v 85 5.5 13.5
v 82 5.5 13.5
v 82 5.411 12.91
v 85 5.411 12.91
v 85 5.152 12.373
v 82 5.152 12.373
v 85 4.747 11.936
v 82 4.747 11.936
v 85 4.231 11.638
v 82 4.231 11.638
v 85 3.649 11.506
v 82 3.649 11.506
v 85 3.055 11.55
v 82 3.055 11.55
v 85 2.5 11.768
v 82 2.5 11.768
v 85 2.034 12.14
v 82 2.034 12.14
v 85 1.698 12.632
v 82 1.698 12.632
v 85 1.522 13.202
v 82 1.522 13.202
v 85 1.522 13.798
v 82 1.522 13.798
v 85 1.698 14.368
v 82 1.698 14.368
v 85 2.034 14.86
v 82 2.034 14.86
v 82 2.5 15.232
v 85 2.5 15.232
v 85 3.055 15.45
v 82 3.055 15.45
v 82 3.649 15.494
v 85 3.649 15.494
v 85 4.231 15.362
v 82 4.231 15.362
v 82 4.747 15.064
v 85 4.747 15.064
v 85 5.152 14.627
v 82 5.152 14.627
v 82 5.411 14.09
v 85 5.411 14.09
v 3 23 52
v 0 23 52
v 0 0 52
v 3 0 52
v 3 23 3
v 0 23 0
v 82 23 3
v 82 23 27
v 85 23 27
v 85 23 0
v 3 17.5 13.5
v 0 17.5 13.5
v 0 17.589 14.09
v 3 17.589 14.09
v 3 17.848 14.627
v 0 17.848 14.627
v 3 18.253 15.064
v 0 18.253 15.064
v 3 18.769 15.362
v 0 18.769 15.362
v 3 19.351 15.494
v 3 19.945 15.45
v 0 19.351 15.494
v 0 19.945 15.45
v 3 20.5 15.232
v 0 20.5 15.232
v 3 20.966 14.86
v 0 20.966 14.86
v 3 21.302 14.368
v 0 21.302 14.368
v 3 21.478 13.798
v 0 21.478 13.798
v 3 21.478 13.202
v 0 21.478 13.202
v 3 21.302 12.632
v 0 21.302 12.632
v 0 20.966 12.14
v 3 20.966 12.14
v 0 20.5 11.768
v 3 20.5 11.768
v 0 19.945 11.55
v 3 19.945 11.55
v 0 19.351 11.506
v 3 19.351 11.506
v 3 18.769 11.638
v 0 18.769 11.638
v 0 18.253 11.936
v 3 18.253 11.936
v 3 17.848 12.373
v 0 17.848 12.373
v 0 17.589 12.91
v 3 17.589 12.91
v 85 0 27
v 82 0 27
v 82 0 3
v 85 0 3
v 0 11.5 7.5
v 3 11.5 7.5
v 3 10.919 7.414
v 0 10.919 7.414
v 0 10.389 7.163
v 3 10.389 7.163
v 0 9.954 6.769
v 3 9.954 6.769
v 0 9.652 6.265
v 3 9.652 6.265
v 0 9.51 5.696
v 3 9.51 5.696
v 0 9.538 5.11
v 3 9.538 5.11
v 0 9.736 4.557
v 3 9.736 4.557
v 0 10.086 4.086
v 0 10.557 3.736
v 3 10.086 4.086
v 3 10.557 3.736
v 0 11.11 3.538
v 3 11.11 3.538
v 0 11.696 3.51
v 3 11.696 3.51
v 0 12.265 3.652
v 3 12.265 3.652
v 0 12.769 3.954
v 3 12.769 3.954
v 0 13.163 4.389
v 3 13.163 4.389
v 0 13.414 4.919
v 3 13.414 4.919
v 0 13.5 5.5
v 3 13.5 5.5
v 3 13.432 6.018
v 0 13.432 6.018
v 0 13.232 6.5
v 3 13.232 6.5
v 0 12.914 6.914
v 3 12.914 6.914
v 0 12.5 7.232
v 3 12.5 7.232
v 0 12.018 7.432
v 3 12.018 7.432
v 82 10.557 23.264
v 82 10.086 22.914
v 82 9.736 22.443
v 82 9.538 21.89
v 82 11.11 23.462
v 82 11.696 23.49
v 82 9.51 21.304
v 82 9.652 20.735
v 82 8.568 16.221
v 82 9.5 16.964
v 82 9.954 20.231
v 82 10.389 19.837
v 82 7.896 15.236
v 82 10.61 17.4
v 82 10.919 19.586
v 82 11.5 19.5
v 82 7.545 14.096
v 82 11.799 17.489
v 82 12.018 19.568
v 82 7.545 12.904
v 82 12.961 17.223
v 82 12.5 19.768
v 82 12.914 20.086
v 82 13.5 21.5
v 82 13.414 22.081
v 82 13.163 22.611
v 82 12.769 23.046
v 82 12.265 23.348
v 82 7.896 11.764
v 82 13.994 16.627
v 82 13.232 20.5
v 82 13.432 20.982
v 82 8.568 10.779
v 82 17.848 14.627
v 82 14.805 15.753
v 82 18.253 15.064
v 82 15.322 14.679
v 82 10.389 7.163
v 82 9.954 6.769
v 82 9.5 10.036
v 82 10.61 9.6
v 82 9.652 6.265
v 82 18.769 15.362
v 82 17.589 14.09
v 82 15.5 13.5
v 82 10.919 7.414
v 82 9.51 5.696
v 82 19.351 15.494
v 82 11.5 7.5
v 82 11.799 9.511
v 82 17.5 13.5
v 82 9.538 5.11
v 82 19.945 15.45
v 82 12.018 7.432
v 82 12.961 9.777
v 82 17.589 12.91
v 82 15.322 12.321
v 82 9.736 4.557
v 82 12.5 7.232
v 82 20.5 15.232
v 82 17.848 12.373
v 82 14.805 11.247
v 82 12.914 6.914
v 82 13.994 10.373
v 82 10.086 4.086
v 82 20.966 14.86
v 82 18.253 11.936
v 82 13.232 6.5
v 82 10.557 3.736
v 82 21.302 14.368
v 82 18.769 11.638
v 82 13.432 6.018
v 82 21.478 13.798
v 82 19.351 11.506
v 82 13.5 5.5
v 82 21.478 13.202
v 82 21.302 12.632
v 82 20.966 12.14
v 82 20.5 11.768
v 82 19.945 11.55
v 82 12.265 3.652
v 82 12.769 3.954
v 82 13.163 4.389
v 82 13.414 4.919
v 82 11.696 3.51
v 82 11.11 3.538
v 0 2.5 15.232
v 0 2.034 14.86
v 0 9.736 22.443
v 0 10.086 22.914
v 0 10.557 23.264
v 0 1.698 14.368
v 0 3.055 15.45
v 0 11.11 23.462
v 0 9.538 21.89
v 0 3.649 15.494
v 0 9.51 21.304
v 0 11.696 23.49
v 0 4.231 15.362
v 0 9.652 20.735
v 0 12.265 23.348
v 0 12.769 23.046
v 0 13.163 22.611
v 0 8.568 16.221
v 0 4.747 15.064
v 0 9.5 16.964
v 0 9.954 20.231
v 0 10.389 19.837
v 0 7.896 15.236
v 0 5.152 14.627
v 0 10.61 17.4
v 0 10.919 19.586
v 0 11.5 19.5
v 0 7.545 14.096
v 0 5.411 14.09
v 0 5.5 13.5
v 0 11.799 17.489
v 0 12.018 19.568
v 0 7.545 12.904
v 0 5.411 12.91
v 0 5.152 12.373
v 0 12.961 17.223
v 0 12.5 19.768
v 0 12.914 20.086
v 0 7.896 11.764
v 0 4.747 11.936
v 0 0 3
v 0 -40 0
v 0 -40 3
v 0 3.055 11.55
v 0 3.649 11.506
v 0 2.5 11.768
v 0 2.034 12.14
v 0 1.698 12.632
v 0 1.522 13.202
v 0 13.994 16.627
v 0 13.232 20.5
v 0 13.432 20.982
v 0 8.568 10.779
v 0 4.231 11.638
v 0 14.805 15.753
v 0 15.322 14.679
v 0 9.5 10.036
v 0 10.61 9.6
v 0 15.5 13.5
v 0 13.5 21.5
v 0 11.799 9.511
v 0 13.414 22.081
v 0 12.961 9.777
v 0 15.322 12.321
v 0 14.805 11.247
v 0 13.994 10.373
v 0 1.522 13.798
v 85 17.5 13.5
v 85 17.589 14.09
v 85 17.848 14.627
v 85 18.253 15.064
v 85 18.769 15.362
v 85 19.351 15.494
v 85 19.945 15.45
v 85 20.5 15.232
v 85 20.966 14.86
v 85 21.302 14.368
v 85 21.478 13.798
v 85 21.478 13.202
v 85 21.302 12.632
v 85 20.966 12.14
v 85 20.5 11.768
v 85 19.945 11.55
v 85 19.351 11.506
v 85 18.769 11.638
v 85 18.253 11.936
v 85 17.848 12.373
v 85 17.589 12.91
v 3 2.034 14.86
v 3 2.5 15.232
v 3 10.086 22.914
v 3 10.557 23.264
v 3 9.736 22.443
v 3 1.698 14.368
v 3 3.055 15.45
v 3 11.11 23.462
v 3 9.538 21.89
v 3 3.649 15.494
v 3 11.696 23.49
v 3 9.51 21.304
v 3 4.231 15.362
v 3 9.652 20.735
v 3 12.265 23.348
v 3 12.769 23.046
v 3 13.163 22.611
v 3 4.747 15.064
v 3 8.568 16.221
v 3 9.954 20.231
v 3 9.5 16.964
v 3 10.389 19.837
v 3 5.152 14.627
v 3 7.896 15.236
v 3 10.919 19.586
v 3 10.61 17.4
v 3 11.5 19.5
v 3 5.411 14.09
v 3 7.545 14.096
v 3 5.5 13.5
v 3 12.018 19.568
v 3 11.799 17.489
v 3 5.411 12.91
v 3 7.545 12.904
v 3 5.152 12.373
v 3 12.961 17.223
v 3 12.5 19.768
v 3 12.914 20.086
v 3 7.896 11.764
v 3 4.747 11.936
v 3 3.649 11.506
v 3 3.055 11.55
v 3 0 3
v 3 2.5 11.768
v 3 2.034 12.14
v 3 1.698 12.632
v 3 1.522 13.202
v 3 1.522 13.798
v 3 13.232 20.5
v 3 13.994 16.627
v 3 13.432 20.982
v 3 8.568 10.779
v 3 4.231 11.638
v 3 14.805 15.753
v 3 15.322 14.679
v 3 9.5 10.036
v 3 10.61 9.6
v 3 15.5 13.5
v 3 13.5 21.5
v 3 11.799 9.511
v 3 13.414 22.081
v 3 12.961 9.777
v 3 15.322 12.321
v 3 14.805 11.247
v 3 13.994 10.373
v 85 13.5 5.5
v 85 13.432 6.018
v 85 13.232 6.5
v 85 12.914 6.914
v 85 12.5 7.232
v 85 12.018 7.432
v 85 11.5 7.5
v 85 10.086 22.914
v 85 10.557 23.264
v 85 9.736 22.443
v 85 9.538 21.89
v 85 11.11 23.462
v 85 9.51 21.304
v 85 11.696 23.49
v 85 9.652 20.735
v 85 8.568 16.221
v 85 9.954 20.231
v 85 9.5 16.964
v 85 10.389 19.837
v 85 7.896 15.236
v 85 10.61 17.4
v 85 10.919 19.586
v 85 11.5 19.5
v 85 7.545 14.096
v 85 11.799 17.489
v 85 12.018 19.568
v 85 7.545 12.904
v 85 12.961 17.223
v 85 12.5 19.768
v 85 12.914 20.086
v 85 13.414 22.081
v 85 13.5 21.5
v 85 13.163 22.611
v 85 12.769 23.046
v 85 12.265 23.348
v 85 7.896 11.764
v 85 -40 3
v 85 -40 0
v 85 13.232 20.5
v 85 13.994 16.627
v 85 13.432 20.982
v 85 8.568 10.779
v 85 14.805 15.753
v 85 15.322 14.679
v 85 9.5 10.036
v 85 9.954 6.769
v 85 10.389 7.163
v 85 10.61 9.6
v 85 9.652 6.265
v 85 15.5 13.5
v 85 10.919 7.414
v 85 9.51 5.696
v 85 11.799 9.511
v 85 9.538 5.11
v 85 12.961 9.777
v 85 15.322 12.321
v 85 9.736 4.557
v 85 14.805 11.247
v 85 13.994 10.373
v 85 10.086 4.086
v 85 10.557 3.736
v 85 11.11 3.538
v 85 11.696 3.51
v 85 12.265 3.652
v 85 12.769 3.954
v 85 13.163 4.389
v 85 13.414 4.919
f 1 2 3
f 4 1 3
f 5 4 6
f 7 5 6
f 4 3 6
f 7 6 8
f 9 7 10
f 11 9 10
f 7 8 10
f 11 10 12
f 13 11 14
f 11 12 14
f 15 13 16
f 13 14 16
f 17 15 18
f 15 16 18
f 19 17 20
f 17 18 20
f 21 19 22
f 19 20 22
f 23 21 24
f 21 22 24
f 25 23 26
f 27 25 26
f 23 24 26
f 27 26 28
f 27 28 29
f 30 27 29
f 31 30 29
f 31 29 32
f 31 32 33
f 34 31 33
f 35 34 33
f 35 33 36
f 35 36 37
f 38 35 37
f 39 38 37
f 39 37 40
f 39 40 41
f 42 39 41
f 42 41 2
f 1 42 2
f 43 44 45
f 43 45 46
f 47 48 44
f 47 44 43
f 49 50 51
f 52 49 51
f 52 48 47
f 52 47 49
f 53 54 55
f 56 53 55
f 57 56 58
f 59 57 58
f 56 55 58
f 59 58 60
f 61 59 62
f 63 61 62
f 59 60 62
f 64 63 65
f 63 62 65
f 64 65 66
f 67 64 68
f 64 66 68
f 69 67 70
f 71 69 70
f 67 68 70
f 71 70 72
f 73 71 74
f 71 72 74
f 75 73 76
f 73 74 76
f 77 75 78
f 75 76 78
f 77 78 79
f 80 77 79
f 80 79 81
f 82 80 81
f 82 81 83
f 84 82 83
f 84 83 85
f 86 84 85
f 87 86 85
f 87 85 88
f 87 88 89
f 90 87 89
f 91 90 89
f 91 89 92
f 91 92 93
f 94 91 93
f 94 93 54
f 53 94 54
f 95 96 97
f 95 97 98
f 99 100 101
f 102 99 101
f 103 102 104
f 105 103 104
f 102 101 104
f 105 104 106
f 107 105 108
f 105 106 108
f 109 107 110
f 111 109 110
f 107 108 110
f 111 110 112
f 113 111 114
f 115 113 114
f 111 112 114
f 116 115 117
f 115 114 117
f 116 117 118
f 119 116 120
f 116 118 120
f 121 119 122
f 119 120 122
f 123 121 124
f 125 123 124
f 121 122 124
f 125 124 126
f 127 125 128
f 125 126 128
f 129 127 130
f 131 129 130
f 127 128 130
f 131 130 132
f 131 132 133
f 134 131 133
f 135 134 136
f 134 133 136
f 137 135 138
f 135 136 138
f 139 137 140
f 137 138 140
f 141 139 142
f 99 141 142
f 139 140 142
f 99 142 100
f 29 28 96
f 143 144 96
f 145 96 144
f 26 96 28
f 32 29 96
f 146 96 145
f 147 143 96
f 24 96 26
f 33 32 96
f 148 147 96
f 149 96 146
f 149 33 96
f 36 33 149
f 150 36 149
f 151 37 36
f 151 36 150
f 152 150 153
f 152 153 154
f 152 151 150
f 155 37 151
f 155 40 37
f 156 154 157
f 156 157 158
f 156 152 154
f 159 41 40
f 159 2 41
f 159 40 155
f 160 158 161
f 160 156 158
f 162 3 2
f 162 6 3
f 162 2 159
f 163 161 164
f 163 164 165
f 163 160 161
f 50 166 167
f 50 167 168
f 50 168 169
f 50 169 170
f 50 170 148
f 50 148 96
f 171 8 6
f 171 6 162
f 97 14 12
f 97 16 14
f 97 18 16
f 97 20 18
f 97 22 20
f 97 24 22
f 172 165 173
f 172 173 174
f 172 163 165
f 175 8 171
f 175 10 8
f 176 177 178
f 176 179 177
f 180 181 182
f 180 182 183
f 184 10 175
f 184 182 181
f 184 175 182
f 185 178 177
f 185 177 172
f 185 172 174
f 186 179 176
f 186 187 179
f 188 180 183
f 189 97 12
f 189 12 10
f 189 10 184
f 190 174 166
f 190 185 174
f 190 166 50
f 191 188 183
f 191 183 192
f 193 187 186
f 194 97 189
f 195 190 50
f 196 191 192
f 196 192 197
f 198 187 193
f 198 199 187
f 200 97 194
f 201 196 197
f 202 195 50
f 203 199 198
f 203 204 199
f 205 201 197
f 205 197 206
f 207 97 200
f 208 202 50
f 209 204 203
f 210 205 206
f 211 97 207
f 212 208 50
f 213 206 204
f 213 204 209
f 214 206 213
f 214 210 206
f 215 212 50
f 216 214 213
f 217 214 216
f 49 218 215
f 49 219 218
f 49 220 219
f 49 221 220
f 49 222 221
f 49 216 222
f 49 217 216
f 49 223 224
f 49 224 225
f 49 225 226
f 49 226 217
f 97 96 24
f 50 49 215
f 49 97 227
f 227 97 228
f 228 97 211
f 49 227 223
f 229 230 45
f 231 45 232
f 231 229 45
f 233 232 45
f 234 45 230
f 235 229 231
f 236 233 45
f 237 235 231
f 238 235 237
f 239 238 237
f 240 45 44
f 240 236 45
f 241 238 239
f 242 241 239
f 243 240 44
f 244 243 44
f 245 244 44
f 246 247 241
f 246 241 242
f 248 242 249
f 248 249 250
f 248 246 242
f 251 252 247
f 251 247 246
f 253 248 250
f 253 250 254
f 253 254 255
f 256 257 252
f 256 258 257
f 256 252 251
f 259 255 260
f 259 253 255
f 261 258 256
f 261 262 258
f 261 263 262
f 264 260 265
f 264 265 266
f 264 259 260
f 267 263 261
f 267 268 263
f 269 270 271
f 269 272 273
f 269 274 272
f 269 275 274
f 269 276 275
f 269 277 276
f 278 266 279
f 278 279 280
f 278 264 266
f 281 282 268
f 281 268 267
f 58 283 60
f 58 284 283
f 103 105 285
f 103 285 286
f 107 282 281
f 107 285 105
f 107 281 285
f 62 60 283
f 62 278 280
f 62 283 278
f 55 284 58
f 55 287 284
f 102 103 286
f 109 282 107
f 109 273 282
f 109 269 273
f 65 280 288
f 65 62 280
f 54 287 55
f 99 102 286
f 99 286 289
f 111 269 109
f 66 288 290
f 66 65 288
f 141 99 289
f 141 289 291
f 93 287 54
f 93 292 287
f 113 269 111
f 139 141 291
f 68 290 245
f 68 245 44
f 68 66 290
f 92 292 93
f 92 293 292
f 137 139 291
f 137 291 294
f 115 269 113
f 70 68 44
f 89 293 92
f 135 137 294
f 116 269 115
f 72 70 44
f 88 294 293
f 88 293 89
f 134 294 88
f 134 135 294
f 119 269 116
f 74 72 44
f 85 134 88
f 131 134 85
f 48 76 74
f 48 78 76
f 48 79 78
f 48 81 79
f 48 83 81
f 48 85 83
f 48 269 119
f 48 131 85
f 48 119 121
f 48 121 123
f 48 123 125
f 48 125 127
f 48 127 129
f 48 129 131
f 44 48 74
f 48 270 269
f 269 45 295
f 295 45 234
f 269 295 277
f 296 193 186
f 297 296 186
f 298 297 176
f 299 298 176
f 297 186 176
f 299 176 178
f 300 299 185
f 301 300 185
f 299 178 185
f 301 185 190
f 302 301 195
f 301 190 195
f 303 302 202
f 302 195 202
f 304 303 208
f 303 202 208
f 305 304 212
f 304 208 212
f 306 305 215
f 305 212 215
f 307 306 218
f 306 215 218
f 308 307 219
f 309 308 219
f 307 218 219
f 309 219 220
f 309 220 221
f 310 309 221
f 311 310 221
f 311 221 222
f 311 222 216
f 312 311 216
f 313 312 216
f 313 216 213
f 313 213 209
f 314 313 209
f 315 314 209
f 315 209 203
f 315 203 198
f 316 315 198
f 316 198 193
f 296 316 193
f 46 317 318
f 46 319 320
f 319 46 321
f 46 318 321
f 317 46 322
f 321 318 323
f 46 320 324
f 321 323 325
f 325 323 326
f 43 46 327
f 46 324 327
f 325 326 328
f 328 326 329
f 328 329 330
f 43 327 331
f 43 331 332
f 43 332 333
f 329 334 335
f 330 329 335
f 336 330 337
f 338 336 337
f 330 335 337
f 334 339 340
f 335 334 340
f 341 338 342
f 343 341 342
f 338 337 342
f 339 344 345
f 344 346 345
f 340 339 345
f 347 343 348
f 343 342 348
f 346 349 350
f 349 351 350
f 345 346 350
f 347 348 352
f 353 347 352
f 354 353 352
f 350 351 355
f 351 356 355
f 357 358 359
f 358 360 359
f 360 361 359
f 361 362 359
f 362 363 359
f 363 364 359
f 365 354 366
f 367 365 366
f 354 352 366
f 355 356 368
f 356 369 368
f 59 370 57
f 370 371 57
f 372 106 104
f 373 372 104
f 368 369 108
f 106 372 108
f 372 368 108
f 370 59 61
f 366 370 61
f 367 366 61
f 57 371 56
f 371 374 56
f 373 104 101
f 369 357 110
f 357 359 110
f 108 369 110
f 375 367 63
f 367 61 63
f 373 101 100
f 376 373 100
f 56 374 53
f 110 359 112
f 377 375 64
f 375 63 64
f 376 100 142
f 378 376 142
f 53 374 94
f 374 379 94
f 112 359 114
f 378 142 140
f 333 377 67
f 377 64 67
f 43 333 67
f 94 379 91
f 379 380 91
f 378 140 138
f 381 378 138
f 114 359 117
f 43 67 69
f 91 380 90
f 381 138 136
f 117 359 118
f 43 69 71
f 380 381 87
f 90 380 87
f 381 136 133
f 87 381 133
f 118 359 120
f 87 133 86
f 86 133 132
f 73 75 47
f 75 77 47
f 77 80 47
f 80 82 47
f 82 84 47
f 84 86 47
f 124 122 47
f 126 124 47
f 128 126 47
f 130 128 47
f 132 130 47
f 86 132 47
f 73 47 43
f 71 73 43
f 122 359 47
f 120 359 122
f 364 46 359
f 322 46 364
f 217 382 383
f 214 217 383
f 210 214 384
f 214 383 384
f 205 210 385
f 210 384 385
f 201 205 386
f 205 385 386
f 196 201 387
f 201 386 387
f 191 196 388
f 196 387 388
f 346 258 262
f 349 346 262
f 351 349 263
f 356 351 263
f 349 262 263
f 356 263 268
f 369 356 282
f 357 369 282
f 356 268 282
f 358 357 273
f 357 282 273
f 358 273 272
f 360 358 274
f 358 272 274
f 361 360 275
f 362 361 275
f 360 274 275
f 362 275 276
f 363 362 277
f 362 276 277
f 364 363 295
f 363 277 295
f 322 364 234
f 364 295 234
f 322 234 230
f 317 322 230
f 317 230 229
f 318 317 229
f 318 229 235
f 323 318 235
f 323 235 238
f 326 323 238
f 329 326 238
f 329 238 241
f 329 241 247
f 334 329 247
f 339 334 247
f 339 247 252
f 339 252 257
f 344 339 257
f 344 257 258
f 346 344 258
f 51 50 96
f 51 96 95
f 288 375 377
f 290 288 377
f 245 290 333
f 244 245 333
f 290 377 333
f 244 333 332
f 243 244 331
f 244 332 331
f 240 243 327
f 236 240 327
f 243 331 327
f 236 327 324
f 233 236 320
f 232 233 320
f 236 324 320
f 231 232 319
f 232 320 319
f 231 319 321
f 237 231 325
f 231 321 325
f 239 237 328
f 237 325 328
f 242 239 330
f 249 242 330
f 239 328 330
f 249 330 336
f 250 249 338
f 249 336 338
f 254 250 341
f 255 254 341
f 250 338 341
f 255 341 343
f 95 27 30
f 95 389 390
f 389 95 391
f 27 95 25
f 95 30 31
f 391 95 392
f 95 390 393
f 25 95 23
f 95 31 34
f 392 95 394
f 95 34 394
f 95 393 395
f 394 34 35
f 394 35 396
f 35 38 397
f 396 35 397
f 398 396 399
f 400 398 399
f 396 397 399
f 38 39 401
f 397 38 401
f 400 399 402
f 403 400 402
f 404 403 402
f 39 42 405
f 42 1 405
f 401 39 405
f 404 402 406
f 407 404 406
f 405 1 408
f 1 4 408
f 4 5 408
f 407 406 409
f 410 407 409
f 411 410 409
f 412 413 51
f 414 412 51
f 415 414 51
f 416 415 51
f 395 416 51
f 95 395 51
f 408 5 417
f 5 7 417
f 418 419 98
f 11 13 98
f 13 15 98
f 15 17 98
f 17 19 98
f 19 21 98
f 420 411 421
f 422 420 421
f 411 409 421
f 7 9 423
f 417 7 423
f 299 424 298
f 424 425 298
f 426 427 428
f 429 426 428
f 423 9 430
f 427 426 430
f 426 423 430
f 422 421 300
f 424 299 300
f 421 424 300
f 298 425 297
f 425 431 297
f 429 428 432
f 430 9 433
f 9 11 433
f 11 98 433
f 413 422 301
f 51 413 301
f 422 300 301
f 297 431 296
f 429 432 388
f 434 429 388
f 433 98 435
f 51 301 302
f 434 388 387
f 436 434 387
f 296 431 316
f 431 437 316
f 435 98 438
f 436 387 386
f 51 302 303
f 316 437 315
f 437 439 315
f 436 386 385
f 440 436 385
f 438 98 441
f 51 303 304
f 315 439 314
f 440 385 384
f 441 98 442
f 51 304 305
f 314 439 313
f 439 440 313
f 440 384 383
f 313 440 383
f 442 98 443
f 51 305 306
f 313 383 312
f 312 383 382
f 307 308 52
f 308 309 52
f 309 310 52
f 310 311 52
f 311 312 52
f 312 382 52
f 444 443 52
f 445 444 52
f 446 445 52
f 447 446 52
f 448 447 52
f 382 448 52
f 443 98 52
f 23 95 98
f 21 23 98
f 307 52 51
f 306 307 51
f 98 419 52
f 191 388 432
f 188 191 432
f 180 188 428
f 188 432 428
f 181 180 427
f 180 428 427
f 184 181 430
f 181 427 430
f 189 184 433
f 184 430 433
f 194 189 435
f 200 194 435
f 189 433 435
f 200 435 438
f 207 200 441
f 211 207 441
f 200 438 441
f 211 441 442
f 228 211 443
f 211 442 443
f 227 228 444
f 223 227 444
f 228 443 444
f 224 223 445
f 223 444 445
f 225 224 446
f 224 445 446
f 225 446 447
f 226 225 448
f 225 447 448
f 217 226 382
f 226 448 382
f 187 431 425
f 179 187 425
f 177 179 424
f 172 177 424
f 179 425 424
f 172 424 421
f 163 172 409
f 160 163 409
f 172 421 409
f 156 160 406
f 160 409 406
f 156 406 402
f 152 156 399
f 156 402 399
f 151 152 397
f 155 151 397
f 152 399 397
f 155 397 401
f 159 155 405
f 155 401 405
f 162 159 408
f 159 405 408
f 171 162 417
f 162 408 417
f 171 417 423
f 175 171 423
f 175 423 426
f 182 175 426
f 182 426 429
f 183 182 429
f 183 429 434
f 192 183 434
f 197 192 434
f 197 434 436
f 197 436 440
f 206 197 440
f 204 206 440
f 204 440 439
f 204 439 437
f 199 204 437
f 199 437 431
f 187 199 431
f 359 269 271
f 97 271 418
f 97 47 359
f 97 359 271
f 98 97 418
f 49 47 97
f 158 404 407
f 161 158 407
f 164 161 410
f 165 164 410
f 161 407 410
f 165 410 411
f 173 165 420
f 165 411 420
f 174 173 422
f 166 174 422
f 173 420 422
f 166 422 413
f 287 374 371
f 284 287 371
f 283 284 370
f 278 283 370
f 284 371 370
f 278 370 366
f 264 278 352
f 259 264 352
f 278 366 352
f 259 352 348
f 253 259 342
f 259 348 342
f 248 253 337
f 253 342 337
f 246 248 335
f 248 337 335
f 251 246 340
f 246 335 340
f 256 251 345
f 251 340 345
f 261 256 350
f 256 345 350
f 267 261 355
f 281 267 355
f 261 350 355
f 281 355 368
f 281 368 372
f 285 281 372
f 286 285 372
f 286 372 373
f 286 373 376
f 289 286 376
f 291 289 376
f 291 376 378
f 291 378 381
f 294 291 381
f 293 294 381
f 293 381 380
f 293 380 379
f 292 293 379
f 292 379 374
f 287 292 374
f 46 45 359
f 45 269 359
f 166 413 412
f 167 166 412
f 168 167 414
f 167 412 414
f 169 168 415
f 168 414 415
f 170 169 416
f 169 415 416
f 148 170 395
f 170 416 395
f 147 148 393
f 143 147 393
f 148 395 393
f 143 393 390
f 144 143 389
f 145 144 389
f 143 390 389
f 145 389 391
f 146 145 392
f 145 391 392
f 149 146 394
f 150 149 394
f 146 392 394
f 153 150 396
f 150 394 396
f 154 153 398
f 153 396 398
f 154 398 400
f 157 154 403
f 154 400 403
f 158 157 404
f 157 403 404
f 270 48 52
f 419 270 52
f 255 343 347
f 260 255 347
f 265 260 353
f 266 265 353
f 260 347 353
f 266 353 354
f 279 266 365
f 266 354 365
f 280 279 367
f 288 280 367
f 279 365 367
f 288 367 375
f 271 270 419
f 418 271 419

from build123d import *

# Parameters (mm, degrees)
F0_W      = 85
F0_H      = 23
F0_H_2    = 40
F1_DEPTH  = 3
F2_W      = 3
F2_H      = 23
F3_DEPTH  = 24
F4_W      = 3
F4_H      = 23
F5_DEPTH  = 25
F6_R      = 4
F7_DEPTH  = 200
F8_R      = 2
F9_DEPTH  = 250
F11_DEPTH = 250


with BuildPart() as f1:
    # F0 (on Top) → F1 (new body)
    with BuildSketch(Plane.XY):
        with Locations((42.5, 11.5)):
            Rectangle(F0_W, F0_H)
        with Locations((42.5, -20)):
            Rectangle(F0_W, F0_H_2)
    extrude(amount=F1_DEPTH)

    # F2 (on face) → F3 (join)
    with BuildSketch(Plane.XY.offset(3)):
        with Locations((1.5, 11.5)):
            Rectangle(F2_W, F2_H)
        with Locations((83.5, 11.5)):
            Rectangle(F2_W, F2_H)
    extrude(amount=F3_DEPTH)

    # F4 (on face) → F5 (join)
    with BuildSketch(Plane.XY.offset(27)):
        with Locations((1.5, 11.5)):
            Rectangle(F4_W, F4_H)
    extrude(amount=F5_DEPTH)

    # F6 (on face) → F7 (cut)
    with BuildSketch(Plane.YZ.offset(85)):
        with Locations((11.5, 13.5)):
            Circle(F6_R)
    extrude(amount=-F7_DEPTH, mode=Mode.SUBTRACT)

    # F8 (on face) → F9 (cut)
    with BuildSketch(Plane(origin=(0, 0, 0), x_dir=(0, -1, 0), z_dir=(-1, 0, 0))):
        with BuildLine():
            ThreePointArc((-1.5, 13.5), (-3.5, 15.5), (-5.5, 13.5))
            ThreePointArc((-5.5, 13.5), (-3.5, 11.5), (-1.5, 13.5))
        make_face()
        with Locations((-19.5, 13.5)):
            Circle(F8_R)
    extrude(amount=-F9_DEPTH, mode=Mode.SUBTRACT)

    # F10 (on face) → F11 (cut)
    with BuildSketch(Plane.YZ.offset(85)):
        with BuildLine():
            ThreePointArc((13.5, 21.5), (10.085786, 22.914214), (11.5, 19.5))
            ThreePointArc((11.5, 19.5), (12.914214, 20.085786), (13.5, 21.5))
        make_face()
        with BuildLine():
            ThreePointArc((13.5, 5.5), (12.914214, 6.914214), (11.5, 7.5))
            ThreePointArc((11.5, 7.5), (10.085786, 4.085786), (13.5, 5.5))
        make_face()
    extrude(amount=-F11_DEPTH, mode=Mode.SUBTRACT)


solid = f1.part
